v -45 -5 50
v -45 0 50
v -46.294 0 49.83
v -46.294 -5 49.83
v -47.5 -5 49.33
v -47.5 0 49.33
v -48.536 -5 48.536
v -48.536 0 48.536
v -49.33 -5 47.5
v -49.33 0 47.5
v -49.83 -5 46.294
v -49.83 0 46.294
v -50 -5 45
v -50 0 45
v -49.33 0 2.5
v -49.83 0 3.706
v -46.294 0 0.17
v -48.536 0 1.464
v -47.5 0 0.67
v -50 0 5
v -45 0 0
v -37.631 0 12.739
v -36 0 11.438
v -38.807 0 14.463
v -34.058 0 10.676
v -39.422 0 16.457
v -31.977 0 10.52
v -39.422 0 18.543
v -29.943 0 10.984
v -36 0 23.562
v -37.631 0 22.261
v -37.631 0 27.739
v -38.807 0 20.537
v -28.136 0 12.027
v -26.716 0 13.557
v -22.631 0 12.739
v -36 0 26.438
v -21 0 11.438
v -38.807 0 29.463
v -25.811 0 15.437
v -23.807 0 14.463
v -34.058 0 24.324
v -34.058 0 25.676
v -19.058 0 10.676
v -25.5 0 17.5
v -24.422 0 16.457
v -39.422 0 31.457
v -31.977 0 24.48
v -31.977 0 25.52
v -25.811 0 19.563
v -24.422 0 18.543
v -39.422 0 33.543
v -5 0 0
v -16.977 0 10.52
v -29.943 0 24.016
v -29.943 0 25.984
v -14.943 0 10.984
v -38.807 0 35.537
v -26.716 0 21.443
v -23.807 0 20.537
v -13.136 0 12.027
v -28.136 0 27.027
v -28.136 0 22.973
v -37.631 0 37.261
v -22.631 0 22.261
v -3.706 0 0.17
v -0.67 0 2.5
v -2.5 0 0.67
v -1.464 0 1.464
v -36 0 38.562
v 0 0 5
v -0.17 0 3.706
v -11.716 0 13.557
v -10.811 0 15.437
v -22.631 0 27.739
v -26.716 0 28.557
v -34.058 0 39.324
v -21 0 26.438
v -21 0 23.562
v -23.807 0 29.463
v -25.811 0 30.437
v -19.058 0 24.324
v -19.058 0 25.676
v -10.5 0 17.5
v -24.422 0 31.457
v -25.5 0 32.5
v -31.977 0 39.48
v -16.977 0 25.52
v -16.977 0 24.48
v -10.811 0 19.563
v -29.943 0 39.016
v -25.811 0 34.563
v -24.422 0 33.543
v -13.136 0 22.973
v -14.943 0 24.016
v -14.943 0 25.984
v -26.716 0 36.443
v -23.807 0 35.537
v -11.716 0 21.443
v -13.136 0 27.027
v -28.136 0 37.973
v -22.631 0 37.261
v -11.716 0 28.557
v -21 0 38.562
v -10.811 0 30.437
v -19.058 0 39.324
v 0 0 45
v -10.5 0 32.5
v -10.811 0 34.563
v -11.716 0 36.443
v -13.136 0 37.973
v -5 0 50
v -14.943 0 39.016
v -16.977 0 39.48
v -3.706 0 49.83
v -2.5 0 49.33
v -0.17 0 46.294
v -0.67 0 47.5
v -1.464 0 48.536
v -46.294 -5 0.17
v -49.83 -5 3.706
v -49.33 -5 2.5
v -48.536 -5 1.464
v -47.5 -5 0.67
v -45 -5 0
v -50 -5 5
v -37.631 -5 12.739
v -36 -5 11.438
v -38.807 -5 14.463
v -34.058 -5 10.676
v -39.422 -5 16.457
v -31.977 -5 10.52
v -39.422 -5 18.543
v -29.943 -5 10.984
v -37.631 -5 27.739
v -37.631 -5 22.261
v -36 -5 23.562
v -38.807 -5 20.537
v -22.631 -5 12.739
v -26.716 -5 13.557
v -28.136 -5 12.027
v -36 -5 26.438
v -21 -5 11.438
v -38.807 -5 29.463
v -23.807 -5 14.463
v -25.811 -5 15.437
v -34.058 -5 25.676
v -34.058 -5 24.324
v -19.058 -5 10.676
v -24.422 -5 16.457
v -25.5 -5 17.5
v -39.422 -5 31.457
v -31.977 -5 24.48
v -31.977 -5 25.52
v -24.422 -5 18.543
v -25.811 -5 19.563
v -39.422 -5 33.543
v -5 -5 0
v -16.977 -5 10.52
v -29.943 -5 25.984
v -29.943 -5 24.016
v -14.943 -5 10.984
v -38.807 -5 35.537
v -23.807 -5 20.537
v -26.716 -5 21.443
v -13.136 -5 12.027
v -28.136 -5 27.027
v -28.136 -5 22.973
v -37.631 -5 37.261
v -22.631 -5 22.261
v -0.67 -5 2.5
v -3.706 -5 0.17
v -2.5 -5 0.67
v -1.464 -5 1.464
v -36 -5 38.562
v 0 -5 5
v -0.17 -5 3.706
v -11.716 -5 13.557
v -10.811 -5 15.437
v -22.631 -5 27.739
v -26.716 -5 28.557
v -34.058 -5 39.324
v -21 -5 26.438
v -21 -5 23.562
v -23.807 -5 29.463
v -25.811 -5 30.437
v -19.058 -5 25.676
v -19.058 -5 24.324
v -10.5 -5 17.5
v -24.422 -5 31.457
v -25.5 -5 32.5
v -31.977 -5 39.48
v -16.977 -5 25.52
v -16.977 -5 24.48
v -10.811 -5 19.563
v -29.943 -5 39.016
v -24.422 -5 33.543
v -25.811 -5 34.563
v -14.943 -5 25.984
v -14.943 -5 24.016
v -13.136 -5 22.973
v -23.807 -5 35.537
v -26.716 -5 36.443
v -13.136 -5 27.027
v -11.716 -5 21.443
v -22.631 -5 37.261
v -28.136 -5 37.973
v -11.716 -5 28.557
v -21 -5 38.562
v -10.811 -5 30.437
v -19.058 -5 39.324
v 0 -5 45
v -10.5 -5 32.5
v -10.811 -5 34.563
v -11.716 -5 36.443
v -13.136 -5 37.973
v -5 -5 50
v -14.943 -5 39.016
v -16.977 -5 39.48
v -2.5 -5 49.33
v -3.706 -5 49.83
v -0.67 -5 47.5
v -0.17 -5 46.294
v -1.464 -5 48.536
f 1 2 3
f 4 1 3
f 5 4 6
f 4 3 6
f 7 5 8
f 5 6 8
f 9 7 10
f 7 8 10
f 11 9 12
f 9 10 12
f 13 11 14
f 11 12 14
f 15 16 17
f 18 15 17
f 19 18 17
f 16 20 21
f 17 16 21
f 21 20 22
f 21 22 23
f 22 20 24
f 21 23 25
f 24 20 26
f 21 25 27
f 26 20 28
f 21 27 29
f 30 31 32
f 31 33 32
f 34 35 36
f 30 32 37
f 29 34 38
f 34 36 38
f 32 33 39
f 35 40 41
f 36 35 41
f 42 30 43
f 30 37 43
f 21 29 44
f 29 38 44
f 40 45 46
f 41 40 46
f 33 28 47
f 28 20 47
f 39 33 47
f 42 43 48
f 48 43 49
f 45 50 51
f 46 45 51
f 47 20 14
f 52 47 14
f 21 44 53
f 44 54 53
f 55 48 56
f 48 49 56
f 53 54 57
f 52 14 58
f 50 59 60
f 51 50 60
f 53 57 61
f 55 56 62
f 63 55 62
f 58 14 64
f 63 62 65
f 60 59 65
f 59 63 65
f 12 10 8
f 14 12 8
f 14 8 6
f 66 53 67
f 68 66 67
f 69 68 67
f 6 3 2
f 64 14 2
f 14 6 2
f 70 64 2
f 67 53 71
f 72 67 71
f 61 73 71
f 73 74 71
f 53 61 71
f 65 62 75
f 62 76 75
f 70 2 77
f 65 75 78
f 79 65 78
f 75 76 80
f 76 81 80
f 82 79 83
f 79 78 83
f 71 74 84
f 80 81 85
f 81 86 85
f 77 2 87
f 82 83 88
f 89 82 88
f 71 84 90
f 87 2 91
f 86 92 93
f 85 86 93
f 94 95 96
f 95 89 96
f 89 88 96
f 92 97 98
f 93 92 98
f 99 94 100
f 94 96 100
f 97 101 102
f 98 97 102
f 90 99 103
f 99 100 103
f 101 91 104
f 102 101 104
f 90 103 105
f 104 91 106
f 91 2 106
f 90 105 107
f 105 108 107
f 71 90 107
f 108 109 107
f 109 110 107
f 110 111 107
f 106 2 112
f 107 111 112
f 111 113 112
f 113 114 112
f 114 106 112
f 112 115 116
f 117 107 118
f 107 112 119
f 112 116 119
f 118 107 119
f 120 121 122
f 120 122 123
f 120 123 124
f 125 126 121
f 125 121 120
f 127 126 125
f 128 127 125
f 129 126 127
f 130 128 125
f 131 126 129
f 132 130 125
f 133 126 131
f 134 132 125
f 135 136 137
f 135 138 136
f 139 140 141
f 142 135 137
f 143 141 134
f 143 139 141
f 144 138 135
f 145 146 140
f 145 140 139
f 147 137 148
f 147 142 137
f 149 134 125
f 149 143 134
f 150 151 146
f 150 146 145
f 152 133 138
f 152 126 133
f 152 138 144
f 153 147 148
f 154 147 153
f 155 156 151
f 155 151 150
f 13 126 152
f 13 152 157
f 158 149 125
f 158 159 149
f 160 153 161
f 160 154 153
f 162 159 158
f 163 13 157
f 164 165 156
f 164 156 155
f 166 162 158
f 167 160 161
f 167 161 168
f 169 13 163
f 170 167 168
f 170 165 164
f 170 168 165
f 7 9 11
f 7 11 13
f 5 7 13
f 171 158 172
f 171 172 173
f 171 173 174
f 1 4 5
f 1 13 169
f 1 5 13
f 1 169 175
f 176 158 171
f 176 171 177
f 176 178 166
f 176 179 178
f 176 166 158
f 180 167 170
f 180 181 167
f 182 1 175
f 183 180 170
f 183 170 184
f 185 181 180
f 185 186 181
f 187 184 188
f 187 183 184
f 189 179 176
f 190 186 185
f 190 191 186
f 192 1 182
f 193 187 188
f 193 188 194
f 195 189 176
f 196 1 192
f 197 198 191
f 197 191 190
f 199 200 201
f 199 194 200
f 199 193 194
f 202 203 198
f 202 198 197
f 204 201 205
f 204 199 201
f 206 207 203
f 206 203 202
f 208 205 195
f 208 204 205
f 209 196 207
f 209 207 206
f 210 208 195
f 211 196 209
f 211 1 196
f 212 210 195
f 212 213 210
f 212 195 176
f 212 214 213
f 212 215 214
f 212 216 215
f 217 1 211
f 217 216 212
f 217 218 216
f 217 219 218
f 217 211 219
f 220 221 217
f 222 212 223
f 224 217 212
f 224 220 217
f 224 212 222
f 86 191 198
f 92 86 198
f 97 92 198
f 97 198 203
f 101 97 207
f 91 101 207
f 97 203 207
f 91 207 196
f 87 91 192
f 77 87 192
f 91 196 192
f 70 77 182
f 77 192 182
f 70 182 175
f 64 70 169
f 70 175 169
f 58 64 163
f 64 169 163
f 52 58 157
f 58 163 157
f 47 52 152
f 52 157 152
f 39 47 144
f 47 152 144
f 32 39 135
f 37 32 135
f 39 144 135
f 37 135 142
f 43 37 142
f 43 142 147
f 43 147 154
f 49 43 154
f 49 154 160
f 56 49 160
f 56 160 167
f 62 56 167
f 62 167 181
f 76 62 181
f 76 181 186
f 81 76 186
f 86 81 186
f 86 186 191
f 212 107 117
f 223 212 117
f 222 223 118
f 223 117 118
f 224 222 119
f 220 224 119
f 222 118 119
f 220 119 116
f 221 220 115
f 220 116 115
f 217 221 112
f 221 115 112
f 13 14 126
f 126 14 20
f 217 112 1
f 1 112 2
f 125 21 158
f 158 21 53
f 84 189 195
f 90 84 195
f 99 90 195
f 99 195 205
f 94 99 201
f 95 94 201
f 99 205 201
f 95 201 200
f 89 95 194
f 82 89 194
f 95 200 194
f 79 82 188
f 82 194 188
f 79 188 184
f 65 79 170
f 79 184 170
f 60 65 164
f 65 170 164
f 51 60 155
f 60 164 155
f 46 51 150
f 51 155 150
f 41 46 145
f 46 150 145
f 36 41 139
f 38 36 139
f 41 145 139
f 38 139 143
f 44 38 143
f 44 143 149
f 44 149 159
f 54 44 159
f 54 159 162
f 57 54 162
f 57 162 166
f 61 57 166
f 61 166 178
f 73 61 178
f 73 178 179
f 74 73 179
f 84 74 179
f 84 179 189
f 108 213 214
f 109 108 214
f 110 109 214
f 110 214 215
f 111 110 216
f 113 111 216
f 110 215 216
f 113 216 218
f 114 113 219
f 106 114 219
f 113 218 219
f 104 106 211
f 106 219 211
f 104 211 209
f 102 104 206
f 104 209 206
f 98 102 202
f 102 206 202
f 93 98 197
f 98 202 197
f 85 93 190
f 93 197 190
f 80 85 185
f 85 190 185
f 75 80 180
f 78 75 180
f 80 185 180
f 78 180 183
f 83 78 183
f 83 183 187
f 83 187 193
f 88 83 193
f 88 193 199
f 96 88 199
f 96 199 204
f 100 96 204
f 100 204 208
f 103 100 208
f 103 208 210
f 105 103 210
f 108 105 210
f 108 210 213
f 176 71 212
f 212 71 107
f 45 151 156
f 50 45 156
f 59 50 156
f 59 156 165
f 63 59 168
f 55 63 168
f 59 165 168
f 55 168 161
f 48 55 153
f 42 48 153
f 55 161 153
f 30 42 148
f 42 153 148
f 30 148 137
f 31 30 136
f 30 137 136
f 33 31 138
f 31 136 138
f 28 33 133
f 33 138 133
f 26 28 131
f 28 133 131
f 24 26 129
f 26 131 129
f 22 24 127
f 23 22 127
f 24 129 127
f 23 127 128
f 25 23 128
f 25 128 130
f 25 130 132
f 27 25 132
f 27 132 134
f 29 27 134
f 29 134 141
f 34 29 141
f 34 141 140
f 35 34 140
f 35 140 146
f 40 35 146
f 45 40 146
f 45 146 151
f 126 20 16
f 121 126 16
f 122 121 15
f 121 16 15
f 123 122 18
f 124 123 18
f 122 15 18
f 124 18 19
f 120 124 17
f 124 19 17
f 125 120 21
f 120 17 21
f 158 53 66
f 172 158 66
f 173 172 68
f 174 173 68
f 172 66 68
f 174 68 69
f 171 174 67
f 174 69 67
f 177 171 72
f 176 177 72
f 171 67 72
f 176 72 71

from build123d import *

# Parameters (mm, degrees)
F1_DEPTH = 5
F2_R     = 7
F3_DEPTH = 5.001


with BuildPart() as f1:
    # F0 (on Front) → F1 (new body)
    with BuildSketch(Plane.XZ):
        with BuildLine():
            Line((-5, 50), (-45, 50))
            ThreePointArc((-45, 50), (-48.535534, 48.535534), (-50, 45))
            Line((-50, 45), (-50, 5))
            ThreePointArc((-50, 5), (-48.535534, 1.464466), (-45, 0))
            Line((-45, 0), (-5, 0))
            ThreePointArc((-5, 0), (-1.464466, 1.464466), (0, 5))
            Line((0, 5), (0, 45))
            ThreePointArc((0, 45), (-1.464466, 48.535534), (-5, 50))
        make_face()
    extrude(amount=F1_DEPTH)

    # F2 (on face) → F3 (cut, through all)
    with BuildSketch(Plane.XZ.offset(5)):
        with Locations((-17.5, 32.5)):
            Circle(F2_R)
        with Locations((-32.5, 32.5)):
            Circle(F2_R)
        with Locations((-17.5, 17.5)):
            Circle(F2_R)
        with Locations((-32.5, 17.5)):
            Circle(F2_R)
    extrude(amount=-F3_DEPTH, mode=Mode.SUBTRACT)


solid = f1.part
